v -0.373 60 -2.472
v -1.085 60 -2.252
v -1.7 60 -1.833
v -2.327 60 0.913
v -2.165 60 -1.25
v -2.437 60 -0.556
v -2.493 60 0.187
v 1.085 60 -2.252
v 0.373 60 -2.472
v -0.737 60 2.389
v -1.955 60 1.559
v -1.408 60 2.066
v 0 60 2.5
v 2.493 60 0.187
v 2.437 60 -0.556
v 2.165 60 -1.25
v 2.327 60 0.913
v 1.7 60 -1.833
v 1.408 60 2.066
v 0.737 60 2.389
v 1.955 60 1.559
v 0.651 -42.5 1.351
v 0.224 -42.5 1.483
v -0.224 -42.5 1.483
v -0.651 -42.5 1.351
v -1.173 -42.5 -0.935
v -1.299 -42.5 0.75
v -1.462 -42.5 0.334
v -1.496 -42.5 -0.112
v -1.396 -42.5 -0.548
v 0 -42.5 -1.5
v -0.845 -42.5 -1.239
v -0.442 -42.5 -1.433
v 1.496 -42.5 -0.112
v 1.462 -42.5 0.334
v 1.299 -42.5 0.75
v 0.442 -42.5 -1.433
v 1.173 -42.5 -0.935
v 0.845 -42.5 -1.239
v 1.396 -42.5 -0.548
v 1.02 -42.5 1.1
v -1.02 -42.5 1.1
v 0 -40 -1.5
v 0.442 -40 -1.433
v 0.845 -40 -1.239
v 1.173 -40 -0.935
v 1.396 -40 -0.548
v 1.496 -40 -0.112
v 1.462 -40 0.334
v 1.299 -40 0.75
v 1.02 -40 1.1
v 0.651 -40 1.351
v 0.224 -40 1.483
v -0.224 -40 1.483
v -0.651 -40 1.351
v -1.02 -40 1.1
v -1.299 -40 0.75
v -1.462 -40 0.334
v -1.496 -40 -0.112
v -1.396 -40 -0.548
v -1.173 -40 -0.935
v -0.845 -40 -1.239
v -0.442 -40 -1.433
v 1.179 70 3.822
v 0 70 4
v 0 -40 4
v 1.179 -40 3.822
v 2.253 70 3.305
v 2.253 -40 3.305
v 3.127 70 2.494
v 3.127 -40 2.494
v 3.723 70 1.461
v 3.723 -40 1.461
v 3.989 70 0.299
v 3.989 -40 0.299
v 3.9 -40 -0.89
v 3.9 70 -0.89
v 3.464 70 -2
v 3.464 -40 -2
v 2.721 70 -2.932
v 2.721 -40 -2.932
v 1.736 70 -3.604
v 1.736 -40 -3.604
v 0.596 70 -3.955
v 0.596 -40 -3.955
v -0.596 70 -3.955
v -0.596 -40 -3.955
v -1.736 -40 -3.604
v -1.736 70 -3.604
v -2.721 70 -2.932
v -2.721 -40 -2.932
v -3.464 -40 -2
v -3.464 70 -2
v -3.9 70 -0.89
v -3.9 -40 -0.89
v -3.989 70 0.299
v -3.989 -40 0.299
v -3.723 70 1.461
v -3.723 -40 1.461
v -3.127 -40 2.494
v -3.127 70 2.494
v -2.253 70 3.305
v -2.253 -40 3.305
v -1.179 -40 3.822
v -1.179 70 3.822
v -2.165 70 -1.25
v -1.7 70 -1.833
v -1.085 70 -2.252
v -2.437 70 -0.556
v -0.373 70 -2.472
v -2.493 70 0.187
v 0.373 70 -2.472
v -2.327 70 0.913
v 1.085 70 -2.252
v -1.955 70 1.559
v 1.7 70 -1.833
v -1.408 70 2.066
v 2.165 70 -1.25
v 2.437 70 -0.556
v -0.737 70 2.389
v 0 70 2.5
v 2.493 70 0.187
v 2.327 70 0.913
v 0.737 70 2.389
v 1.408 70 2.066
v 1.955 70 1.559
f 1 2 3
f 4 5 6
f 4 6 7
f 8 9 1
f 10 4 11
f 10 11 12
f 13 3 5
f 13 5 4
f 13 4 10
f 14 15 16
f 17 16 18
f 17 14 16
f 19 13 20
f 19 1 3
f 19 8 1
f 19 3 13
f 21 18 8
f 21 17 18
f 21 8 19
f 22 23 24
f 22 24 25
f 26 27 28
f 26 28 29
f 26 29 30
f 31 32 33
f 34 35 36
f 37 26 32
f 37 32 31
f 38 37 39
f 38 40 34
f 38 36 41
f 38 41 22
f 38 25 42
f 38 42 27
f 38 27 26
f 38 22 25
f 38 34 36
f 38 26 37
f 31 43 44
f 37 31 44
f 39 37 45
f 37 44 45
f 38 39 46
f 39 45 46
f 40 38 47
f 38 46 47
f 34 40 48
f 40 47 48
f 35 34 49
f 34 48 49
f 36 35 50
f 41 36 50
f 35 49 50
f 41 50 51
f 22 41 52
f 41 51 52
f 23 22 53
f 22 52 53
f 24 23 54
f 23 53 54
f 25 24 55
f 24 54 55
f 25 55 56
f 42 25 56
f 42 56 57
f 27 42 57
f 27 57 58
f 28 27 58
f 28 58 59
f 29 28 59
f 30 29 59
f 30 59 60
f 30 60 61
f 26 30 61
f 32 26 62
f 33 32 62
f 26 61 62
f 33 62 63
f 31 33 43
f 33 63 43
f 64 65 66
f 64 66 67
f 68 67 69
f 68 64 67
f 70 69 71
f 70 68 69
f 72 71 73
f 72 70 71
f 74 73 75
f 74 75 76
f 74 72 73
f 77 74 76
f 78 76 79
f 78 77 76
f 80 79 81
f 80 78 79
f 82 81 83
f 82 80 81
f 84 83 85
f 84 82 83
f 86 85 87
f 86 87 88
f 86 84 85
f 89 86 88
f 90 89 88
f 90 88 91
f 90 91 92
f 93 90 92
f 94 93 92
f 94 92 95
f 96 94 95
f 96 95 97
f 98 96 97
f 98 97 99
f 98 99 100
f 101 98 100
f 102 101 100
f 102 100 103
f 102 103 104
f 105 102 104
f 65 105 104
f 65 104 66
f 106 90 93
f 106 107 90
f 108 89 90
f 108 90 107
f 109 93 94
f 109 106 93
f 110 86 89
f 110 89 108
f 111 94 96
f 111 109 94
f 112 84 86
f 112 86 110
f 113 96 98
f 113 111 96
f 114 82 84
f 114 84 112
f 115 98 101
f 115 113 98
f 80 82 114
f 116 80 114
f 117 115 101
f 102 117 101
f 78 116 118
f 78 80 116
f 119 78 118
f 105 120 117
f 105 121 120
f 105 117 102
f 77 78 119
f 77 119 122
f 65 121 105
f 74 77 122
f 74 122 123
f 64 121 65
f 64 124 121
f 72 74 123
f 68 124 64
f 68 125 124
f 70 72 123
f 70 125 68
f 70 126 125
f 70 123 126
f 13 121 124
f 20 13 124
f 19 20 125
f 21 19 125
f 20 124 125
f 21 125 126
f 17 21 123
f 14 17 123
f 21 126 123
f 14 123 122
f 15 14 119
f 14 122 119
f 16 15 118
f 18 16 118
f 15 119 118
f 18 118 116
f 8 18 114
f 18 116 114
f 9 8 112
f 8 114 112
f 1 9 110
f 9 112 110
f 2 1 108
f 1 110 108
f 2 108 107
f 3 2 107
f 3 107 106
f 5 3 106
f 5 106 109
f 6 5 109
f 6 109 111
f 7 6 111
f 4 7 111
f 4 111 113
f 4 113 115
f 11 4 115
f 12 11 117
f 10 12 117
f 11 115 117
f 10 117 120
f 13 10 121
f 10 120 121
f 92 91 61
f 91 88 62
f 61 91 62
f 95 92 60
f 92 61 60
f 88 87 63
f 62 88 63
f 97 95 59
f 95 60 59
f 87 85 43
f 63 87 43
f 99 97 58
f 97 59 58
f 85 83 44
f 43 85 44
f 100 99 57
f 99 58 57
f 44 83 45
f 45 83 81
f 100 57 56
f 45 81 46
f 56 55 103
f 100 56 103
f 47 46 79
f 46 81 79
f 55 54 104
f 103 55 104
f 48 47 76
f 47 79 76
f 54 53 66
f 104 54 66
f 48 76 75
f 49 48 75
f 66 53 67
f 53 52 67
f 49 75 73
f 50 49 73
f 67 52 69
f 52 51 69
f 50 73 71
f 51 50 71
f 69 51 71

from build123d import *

# Parameters (mm, degrees)
SKETCH1_R           = 4
BOSS_EXTRUDE1_DEPTH = 40
SKETCH2_R           = 1.5
BOSS_EXTRUDE2_DEPTH = 2.5
BOSS_EXTRUDE3_START = 70
SKETCH3_R           = 4
BOSS_EXTRUDE3_DEPTH = 70
SKETCH4_R           = 2.5
CUT_EXTRUDE1_DEPTH  = 10


with BuildPart() as part:
    # Sketch1 → Boss-Extrude1 (new body)
    with BuildSketch(Plane(origin=(0, 0, 0), x_dir=(1, 0, 0), z_dir=(0, 1, 0))):
        with Locations(Location((0, 0, 0), (0, 0, 270))):
            Circle(SKETCH1_R)
    extrude(amount=-BOSS_EXTRUDE1_DEPTH)

    # Sketch2 → Boss-Extrude2 (add)
    with BuildSketch(Plane.XZ.offset(40)):
        with Locations(Location((0, 0, 0), (0, 0, 270))):
            Circle(SKETCH2_R)
    extrude(amount=BOSS_EXTRUDE2_DEPTH)

    # Sketch3 → Boss-Extrude3 (add)
    with BuildSketch(Plane(origin=(0, 0, 0), x_dir=(1, 0, 0), z_dir=(0, 1, 0)).offset(BOSS_EXTRUDE3_START)):
        with Locations(Location((0, 0, 0), (0, 0, 270))):
            Circle(SKETCH3_R)
    extrude(amount=-BOSS_EXTRUDE3_DEPTH)

    # Sketch4 → Cut-Extrude1 (cut)
    with BuildSketch(Plane(origin=(0, 70, 0), x_dir=(1, 0, 0), z_dir=(0, 1, 0))):
        with Locations(Location((0, 0, 0), (0, 0, 270))):
            Circle(SKETCH4_R)
    extrude(amount=-CUT_EXTRUDE1_DEPTH, mode=Mode.SUBTRACT)


solid = part.part
